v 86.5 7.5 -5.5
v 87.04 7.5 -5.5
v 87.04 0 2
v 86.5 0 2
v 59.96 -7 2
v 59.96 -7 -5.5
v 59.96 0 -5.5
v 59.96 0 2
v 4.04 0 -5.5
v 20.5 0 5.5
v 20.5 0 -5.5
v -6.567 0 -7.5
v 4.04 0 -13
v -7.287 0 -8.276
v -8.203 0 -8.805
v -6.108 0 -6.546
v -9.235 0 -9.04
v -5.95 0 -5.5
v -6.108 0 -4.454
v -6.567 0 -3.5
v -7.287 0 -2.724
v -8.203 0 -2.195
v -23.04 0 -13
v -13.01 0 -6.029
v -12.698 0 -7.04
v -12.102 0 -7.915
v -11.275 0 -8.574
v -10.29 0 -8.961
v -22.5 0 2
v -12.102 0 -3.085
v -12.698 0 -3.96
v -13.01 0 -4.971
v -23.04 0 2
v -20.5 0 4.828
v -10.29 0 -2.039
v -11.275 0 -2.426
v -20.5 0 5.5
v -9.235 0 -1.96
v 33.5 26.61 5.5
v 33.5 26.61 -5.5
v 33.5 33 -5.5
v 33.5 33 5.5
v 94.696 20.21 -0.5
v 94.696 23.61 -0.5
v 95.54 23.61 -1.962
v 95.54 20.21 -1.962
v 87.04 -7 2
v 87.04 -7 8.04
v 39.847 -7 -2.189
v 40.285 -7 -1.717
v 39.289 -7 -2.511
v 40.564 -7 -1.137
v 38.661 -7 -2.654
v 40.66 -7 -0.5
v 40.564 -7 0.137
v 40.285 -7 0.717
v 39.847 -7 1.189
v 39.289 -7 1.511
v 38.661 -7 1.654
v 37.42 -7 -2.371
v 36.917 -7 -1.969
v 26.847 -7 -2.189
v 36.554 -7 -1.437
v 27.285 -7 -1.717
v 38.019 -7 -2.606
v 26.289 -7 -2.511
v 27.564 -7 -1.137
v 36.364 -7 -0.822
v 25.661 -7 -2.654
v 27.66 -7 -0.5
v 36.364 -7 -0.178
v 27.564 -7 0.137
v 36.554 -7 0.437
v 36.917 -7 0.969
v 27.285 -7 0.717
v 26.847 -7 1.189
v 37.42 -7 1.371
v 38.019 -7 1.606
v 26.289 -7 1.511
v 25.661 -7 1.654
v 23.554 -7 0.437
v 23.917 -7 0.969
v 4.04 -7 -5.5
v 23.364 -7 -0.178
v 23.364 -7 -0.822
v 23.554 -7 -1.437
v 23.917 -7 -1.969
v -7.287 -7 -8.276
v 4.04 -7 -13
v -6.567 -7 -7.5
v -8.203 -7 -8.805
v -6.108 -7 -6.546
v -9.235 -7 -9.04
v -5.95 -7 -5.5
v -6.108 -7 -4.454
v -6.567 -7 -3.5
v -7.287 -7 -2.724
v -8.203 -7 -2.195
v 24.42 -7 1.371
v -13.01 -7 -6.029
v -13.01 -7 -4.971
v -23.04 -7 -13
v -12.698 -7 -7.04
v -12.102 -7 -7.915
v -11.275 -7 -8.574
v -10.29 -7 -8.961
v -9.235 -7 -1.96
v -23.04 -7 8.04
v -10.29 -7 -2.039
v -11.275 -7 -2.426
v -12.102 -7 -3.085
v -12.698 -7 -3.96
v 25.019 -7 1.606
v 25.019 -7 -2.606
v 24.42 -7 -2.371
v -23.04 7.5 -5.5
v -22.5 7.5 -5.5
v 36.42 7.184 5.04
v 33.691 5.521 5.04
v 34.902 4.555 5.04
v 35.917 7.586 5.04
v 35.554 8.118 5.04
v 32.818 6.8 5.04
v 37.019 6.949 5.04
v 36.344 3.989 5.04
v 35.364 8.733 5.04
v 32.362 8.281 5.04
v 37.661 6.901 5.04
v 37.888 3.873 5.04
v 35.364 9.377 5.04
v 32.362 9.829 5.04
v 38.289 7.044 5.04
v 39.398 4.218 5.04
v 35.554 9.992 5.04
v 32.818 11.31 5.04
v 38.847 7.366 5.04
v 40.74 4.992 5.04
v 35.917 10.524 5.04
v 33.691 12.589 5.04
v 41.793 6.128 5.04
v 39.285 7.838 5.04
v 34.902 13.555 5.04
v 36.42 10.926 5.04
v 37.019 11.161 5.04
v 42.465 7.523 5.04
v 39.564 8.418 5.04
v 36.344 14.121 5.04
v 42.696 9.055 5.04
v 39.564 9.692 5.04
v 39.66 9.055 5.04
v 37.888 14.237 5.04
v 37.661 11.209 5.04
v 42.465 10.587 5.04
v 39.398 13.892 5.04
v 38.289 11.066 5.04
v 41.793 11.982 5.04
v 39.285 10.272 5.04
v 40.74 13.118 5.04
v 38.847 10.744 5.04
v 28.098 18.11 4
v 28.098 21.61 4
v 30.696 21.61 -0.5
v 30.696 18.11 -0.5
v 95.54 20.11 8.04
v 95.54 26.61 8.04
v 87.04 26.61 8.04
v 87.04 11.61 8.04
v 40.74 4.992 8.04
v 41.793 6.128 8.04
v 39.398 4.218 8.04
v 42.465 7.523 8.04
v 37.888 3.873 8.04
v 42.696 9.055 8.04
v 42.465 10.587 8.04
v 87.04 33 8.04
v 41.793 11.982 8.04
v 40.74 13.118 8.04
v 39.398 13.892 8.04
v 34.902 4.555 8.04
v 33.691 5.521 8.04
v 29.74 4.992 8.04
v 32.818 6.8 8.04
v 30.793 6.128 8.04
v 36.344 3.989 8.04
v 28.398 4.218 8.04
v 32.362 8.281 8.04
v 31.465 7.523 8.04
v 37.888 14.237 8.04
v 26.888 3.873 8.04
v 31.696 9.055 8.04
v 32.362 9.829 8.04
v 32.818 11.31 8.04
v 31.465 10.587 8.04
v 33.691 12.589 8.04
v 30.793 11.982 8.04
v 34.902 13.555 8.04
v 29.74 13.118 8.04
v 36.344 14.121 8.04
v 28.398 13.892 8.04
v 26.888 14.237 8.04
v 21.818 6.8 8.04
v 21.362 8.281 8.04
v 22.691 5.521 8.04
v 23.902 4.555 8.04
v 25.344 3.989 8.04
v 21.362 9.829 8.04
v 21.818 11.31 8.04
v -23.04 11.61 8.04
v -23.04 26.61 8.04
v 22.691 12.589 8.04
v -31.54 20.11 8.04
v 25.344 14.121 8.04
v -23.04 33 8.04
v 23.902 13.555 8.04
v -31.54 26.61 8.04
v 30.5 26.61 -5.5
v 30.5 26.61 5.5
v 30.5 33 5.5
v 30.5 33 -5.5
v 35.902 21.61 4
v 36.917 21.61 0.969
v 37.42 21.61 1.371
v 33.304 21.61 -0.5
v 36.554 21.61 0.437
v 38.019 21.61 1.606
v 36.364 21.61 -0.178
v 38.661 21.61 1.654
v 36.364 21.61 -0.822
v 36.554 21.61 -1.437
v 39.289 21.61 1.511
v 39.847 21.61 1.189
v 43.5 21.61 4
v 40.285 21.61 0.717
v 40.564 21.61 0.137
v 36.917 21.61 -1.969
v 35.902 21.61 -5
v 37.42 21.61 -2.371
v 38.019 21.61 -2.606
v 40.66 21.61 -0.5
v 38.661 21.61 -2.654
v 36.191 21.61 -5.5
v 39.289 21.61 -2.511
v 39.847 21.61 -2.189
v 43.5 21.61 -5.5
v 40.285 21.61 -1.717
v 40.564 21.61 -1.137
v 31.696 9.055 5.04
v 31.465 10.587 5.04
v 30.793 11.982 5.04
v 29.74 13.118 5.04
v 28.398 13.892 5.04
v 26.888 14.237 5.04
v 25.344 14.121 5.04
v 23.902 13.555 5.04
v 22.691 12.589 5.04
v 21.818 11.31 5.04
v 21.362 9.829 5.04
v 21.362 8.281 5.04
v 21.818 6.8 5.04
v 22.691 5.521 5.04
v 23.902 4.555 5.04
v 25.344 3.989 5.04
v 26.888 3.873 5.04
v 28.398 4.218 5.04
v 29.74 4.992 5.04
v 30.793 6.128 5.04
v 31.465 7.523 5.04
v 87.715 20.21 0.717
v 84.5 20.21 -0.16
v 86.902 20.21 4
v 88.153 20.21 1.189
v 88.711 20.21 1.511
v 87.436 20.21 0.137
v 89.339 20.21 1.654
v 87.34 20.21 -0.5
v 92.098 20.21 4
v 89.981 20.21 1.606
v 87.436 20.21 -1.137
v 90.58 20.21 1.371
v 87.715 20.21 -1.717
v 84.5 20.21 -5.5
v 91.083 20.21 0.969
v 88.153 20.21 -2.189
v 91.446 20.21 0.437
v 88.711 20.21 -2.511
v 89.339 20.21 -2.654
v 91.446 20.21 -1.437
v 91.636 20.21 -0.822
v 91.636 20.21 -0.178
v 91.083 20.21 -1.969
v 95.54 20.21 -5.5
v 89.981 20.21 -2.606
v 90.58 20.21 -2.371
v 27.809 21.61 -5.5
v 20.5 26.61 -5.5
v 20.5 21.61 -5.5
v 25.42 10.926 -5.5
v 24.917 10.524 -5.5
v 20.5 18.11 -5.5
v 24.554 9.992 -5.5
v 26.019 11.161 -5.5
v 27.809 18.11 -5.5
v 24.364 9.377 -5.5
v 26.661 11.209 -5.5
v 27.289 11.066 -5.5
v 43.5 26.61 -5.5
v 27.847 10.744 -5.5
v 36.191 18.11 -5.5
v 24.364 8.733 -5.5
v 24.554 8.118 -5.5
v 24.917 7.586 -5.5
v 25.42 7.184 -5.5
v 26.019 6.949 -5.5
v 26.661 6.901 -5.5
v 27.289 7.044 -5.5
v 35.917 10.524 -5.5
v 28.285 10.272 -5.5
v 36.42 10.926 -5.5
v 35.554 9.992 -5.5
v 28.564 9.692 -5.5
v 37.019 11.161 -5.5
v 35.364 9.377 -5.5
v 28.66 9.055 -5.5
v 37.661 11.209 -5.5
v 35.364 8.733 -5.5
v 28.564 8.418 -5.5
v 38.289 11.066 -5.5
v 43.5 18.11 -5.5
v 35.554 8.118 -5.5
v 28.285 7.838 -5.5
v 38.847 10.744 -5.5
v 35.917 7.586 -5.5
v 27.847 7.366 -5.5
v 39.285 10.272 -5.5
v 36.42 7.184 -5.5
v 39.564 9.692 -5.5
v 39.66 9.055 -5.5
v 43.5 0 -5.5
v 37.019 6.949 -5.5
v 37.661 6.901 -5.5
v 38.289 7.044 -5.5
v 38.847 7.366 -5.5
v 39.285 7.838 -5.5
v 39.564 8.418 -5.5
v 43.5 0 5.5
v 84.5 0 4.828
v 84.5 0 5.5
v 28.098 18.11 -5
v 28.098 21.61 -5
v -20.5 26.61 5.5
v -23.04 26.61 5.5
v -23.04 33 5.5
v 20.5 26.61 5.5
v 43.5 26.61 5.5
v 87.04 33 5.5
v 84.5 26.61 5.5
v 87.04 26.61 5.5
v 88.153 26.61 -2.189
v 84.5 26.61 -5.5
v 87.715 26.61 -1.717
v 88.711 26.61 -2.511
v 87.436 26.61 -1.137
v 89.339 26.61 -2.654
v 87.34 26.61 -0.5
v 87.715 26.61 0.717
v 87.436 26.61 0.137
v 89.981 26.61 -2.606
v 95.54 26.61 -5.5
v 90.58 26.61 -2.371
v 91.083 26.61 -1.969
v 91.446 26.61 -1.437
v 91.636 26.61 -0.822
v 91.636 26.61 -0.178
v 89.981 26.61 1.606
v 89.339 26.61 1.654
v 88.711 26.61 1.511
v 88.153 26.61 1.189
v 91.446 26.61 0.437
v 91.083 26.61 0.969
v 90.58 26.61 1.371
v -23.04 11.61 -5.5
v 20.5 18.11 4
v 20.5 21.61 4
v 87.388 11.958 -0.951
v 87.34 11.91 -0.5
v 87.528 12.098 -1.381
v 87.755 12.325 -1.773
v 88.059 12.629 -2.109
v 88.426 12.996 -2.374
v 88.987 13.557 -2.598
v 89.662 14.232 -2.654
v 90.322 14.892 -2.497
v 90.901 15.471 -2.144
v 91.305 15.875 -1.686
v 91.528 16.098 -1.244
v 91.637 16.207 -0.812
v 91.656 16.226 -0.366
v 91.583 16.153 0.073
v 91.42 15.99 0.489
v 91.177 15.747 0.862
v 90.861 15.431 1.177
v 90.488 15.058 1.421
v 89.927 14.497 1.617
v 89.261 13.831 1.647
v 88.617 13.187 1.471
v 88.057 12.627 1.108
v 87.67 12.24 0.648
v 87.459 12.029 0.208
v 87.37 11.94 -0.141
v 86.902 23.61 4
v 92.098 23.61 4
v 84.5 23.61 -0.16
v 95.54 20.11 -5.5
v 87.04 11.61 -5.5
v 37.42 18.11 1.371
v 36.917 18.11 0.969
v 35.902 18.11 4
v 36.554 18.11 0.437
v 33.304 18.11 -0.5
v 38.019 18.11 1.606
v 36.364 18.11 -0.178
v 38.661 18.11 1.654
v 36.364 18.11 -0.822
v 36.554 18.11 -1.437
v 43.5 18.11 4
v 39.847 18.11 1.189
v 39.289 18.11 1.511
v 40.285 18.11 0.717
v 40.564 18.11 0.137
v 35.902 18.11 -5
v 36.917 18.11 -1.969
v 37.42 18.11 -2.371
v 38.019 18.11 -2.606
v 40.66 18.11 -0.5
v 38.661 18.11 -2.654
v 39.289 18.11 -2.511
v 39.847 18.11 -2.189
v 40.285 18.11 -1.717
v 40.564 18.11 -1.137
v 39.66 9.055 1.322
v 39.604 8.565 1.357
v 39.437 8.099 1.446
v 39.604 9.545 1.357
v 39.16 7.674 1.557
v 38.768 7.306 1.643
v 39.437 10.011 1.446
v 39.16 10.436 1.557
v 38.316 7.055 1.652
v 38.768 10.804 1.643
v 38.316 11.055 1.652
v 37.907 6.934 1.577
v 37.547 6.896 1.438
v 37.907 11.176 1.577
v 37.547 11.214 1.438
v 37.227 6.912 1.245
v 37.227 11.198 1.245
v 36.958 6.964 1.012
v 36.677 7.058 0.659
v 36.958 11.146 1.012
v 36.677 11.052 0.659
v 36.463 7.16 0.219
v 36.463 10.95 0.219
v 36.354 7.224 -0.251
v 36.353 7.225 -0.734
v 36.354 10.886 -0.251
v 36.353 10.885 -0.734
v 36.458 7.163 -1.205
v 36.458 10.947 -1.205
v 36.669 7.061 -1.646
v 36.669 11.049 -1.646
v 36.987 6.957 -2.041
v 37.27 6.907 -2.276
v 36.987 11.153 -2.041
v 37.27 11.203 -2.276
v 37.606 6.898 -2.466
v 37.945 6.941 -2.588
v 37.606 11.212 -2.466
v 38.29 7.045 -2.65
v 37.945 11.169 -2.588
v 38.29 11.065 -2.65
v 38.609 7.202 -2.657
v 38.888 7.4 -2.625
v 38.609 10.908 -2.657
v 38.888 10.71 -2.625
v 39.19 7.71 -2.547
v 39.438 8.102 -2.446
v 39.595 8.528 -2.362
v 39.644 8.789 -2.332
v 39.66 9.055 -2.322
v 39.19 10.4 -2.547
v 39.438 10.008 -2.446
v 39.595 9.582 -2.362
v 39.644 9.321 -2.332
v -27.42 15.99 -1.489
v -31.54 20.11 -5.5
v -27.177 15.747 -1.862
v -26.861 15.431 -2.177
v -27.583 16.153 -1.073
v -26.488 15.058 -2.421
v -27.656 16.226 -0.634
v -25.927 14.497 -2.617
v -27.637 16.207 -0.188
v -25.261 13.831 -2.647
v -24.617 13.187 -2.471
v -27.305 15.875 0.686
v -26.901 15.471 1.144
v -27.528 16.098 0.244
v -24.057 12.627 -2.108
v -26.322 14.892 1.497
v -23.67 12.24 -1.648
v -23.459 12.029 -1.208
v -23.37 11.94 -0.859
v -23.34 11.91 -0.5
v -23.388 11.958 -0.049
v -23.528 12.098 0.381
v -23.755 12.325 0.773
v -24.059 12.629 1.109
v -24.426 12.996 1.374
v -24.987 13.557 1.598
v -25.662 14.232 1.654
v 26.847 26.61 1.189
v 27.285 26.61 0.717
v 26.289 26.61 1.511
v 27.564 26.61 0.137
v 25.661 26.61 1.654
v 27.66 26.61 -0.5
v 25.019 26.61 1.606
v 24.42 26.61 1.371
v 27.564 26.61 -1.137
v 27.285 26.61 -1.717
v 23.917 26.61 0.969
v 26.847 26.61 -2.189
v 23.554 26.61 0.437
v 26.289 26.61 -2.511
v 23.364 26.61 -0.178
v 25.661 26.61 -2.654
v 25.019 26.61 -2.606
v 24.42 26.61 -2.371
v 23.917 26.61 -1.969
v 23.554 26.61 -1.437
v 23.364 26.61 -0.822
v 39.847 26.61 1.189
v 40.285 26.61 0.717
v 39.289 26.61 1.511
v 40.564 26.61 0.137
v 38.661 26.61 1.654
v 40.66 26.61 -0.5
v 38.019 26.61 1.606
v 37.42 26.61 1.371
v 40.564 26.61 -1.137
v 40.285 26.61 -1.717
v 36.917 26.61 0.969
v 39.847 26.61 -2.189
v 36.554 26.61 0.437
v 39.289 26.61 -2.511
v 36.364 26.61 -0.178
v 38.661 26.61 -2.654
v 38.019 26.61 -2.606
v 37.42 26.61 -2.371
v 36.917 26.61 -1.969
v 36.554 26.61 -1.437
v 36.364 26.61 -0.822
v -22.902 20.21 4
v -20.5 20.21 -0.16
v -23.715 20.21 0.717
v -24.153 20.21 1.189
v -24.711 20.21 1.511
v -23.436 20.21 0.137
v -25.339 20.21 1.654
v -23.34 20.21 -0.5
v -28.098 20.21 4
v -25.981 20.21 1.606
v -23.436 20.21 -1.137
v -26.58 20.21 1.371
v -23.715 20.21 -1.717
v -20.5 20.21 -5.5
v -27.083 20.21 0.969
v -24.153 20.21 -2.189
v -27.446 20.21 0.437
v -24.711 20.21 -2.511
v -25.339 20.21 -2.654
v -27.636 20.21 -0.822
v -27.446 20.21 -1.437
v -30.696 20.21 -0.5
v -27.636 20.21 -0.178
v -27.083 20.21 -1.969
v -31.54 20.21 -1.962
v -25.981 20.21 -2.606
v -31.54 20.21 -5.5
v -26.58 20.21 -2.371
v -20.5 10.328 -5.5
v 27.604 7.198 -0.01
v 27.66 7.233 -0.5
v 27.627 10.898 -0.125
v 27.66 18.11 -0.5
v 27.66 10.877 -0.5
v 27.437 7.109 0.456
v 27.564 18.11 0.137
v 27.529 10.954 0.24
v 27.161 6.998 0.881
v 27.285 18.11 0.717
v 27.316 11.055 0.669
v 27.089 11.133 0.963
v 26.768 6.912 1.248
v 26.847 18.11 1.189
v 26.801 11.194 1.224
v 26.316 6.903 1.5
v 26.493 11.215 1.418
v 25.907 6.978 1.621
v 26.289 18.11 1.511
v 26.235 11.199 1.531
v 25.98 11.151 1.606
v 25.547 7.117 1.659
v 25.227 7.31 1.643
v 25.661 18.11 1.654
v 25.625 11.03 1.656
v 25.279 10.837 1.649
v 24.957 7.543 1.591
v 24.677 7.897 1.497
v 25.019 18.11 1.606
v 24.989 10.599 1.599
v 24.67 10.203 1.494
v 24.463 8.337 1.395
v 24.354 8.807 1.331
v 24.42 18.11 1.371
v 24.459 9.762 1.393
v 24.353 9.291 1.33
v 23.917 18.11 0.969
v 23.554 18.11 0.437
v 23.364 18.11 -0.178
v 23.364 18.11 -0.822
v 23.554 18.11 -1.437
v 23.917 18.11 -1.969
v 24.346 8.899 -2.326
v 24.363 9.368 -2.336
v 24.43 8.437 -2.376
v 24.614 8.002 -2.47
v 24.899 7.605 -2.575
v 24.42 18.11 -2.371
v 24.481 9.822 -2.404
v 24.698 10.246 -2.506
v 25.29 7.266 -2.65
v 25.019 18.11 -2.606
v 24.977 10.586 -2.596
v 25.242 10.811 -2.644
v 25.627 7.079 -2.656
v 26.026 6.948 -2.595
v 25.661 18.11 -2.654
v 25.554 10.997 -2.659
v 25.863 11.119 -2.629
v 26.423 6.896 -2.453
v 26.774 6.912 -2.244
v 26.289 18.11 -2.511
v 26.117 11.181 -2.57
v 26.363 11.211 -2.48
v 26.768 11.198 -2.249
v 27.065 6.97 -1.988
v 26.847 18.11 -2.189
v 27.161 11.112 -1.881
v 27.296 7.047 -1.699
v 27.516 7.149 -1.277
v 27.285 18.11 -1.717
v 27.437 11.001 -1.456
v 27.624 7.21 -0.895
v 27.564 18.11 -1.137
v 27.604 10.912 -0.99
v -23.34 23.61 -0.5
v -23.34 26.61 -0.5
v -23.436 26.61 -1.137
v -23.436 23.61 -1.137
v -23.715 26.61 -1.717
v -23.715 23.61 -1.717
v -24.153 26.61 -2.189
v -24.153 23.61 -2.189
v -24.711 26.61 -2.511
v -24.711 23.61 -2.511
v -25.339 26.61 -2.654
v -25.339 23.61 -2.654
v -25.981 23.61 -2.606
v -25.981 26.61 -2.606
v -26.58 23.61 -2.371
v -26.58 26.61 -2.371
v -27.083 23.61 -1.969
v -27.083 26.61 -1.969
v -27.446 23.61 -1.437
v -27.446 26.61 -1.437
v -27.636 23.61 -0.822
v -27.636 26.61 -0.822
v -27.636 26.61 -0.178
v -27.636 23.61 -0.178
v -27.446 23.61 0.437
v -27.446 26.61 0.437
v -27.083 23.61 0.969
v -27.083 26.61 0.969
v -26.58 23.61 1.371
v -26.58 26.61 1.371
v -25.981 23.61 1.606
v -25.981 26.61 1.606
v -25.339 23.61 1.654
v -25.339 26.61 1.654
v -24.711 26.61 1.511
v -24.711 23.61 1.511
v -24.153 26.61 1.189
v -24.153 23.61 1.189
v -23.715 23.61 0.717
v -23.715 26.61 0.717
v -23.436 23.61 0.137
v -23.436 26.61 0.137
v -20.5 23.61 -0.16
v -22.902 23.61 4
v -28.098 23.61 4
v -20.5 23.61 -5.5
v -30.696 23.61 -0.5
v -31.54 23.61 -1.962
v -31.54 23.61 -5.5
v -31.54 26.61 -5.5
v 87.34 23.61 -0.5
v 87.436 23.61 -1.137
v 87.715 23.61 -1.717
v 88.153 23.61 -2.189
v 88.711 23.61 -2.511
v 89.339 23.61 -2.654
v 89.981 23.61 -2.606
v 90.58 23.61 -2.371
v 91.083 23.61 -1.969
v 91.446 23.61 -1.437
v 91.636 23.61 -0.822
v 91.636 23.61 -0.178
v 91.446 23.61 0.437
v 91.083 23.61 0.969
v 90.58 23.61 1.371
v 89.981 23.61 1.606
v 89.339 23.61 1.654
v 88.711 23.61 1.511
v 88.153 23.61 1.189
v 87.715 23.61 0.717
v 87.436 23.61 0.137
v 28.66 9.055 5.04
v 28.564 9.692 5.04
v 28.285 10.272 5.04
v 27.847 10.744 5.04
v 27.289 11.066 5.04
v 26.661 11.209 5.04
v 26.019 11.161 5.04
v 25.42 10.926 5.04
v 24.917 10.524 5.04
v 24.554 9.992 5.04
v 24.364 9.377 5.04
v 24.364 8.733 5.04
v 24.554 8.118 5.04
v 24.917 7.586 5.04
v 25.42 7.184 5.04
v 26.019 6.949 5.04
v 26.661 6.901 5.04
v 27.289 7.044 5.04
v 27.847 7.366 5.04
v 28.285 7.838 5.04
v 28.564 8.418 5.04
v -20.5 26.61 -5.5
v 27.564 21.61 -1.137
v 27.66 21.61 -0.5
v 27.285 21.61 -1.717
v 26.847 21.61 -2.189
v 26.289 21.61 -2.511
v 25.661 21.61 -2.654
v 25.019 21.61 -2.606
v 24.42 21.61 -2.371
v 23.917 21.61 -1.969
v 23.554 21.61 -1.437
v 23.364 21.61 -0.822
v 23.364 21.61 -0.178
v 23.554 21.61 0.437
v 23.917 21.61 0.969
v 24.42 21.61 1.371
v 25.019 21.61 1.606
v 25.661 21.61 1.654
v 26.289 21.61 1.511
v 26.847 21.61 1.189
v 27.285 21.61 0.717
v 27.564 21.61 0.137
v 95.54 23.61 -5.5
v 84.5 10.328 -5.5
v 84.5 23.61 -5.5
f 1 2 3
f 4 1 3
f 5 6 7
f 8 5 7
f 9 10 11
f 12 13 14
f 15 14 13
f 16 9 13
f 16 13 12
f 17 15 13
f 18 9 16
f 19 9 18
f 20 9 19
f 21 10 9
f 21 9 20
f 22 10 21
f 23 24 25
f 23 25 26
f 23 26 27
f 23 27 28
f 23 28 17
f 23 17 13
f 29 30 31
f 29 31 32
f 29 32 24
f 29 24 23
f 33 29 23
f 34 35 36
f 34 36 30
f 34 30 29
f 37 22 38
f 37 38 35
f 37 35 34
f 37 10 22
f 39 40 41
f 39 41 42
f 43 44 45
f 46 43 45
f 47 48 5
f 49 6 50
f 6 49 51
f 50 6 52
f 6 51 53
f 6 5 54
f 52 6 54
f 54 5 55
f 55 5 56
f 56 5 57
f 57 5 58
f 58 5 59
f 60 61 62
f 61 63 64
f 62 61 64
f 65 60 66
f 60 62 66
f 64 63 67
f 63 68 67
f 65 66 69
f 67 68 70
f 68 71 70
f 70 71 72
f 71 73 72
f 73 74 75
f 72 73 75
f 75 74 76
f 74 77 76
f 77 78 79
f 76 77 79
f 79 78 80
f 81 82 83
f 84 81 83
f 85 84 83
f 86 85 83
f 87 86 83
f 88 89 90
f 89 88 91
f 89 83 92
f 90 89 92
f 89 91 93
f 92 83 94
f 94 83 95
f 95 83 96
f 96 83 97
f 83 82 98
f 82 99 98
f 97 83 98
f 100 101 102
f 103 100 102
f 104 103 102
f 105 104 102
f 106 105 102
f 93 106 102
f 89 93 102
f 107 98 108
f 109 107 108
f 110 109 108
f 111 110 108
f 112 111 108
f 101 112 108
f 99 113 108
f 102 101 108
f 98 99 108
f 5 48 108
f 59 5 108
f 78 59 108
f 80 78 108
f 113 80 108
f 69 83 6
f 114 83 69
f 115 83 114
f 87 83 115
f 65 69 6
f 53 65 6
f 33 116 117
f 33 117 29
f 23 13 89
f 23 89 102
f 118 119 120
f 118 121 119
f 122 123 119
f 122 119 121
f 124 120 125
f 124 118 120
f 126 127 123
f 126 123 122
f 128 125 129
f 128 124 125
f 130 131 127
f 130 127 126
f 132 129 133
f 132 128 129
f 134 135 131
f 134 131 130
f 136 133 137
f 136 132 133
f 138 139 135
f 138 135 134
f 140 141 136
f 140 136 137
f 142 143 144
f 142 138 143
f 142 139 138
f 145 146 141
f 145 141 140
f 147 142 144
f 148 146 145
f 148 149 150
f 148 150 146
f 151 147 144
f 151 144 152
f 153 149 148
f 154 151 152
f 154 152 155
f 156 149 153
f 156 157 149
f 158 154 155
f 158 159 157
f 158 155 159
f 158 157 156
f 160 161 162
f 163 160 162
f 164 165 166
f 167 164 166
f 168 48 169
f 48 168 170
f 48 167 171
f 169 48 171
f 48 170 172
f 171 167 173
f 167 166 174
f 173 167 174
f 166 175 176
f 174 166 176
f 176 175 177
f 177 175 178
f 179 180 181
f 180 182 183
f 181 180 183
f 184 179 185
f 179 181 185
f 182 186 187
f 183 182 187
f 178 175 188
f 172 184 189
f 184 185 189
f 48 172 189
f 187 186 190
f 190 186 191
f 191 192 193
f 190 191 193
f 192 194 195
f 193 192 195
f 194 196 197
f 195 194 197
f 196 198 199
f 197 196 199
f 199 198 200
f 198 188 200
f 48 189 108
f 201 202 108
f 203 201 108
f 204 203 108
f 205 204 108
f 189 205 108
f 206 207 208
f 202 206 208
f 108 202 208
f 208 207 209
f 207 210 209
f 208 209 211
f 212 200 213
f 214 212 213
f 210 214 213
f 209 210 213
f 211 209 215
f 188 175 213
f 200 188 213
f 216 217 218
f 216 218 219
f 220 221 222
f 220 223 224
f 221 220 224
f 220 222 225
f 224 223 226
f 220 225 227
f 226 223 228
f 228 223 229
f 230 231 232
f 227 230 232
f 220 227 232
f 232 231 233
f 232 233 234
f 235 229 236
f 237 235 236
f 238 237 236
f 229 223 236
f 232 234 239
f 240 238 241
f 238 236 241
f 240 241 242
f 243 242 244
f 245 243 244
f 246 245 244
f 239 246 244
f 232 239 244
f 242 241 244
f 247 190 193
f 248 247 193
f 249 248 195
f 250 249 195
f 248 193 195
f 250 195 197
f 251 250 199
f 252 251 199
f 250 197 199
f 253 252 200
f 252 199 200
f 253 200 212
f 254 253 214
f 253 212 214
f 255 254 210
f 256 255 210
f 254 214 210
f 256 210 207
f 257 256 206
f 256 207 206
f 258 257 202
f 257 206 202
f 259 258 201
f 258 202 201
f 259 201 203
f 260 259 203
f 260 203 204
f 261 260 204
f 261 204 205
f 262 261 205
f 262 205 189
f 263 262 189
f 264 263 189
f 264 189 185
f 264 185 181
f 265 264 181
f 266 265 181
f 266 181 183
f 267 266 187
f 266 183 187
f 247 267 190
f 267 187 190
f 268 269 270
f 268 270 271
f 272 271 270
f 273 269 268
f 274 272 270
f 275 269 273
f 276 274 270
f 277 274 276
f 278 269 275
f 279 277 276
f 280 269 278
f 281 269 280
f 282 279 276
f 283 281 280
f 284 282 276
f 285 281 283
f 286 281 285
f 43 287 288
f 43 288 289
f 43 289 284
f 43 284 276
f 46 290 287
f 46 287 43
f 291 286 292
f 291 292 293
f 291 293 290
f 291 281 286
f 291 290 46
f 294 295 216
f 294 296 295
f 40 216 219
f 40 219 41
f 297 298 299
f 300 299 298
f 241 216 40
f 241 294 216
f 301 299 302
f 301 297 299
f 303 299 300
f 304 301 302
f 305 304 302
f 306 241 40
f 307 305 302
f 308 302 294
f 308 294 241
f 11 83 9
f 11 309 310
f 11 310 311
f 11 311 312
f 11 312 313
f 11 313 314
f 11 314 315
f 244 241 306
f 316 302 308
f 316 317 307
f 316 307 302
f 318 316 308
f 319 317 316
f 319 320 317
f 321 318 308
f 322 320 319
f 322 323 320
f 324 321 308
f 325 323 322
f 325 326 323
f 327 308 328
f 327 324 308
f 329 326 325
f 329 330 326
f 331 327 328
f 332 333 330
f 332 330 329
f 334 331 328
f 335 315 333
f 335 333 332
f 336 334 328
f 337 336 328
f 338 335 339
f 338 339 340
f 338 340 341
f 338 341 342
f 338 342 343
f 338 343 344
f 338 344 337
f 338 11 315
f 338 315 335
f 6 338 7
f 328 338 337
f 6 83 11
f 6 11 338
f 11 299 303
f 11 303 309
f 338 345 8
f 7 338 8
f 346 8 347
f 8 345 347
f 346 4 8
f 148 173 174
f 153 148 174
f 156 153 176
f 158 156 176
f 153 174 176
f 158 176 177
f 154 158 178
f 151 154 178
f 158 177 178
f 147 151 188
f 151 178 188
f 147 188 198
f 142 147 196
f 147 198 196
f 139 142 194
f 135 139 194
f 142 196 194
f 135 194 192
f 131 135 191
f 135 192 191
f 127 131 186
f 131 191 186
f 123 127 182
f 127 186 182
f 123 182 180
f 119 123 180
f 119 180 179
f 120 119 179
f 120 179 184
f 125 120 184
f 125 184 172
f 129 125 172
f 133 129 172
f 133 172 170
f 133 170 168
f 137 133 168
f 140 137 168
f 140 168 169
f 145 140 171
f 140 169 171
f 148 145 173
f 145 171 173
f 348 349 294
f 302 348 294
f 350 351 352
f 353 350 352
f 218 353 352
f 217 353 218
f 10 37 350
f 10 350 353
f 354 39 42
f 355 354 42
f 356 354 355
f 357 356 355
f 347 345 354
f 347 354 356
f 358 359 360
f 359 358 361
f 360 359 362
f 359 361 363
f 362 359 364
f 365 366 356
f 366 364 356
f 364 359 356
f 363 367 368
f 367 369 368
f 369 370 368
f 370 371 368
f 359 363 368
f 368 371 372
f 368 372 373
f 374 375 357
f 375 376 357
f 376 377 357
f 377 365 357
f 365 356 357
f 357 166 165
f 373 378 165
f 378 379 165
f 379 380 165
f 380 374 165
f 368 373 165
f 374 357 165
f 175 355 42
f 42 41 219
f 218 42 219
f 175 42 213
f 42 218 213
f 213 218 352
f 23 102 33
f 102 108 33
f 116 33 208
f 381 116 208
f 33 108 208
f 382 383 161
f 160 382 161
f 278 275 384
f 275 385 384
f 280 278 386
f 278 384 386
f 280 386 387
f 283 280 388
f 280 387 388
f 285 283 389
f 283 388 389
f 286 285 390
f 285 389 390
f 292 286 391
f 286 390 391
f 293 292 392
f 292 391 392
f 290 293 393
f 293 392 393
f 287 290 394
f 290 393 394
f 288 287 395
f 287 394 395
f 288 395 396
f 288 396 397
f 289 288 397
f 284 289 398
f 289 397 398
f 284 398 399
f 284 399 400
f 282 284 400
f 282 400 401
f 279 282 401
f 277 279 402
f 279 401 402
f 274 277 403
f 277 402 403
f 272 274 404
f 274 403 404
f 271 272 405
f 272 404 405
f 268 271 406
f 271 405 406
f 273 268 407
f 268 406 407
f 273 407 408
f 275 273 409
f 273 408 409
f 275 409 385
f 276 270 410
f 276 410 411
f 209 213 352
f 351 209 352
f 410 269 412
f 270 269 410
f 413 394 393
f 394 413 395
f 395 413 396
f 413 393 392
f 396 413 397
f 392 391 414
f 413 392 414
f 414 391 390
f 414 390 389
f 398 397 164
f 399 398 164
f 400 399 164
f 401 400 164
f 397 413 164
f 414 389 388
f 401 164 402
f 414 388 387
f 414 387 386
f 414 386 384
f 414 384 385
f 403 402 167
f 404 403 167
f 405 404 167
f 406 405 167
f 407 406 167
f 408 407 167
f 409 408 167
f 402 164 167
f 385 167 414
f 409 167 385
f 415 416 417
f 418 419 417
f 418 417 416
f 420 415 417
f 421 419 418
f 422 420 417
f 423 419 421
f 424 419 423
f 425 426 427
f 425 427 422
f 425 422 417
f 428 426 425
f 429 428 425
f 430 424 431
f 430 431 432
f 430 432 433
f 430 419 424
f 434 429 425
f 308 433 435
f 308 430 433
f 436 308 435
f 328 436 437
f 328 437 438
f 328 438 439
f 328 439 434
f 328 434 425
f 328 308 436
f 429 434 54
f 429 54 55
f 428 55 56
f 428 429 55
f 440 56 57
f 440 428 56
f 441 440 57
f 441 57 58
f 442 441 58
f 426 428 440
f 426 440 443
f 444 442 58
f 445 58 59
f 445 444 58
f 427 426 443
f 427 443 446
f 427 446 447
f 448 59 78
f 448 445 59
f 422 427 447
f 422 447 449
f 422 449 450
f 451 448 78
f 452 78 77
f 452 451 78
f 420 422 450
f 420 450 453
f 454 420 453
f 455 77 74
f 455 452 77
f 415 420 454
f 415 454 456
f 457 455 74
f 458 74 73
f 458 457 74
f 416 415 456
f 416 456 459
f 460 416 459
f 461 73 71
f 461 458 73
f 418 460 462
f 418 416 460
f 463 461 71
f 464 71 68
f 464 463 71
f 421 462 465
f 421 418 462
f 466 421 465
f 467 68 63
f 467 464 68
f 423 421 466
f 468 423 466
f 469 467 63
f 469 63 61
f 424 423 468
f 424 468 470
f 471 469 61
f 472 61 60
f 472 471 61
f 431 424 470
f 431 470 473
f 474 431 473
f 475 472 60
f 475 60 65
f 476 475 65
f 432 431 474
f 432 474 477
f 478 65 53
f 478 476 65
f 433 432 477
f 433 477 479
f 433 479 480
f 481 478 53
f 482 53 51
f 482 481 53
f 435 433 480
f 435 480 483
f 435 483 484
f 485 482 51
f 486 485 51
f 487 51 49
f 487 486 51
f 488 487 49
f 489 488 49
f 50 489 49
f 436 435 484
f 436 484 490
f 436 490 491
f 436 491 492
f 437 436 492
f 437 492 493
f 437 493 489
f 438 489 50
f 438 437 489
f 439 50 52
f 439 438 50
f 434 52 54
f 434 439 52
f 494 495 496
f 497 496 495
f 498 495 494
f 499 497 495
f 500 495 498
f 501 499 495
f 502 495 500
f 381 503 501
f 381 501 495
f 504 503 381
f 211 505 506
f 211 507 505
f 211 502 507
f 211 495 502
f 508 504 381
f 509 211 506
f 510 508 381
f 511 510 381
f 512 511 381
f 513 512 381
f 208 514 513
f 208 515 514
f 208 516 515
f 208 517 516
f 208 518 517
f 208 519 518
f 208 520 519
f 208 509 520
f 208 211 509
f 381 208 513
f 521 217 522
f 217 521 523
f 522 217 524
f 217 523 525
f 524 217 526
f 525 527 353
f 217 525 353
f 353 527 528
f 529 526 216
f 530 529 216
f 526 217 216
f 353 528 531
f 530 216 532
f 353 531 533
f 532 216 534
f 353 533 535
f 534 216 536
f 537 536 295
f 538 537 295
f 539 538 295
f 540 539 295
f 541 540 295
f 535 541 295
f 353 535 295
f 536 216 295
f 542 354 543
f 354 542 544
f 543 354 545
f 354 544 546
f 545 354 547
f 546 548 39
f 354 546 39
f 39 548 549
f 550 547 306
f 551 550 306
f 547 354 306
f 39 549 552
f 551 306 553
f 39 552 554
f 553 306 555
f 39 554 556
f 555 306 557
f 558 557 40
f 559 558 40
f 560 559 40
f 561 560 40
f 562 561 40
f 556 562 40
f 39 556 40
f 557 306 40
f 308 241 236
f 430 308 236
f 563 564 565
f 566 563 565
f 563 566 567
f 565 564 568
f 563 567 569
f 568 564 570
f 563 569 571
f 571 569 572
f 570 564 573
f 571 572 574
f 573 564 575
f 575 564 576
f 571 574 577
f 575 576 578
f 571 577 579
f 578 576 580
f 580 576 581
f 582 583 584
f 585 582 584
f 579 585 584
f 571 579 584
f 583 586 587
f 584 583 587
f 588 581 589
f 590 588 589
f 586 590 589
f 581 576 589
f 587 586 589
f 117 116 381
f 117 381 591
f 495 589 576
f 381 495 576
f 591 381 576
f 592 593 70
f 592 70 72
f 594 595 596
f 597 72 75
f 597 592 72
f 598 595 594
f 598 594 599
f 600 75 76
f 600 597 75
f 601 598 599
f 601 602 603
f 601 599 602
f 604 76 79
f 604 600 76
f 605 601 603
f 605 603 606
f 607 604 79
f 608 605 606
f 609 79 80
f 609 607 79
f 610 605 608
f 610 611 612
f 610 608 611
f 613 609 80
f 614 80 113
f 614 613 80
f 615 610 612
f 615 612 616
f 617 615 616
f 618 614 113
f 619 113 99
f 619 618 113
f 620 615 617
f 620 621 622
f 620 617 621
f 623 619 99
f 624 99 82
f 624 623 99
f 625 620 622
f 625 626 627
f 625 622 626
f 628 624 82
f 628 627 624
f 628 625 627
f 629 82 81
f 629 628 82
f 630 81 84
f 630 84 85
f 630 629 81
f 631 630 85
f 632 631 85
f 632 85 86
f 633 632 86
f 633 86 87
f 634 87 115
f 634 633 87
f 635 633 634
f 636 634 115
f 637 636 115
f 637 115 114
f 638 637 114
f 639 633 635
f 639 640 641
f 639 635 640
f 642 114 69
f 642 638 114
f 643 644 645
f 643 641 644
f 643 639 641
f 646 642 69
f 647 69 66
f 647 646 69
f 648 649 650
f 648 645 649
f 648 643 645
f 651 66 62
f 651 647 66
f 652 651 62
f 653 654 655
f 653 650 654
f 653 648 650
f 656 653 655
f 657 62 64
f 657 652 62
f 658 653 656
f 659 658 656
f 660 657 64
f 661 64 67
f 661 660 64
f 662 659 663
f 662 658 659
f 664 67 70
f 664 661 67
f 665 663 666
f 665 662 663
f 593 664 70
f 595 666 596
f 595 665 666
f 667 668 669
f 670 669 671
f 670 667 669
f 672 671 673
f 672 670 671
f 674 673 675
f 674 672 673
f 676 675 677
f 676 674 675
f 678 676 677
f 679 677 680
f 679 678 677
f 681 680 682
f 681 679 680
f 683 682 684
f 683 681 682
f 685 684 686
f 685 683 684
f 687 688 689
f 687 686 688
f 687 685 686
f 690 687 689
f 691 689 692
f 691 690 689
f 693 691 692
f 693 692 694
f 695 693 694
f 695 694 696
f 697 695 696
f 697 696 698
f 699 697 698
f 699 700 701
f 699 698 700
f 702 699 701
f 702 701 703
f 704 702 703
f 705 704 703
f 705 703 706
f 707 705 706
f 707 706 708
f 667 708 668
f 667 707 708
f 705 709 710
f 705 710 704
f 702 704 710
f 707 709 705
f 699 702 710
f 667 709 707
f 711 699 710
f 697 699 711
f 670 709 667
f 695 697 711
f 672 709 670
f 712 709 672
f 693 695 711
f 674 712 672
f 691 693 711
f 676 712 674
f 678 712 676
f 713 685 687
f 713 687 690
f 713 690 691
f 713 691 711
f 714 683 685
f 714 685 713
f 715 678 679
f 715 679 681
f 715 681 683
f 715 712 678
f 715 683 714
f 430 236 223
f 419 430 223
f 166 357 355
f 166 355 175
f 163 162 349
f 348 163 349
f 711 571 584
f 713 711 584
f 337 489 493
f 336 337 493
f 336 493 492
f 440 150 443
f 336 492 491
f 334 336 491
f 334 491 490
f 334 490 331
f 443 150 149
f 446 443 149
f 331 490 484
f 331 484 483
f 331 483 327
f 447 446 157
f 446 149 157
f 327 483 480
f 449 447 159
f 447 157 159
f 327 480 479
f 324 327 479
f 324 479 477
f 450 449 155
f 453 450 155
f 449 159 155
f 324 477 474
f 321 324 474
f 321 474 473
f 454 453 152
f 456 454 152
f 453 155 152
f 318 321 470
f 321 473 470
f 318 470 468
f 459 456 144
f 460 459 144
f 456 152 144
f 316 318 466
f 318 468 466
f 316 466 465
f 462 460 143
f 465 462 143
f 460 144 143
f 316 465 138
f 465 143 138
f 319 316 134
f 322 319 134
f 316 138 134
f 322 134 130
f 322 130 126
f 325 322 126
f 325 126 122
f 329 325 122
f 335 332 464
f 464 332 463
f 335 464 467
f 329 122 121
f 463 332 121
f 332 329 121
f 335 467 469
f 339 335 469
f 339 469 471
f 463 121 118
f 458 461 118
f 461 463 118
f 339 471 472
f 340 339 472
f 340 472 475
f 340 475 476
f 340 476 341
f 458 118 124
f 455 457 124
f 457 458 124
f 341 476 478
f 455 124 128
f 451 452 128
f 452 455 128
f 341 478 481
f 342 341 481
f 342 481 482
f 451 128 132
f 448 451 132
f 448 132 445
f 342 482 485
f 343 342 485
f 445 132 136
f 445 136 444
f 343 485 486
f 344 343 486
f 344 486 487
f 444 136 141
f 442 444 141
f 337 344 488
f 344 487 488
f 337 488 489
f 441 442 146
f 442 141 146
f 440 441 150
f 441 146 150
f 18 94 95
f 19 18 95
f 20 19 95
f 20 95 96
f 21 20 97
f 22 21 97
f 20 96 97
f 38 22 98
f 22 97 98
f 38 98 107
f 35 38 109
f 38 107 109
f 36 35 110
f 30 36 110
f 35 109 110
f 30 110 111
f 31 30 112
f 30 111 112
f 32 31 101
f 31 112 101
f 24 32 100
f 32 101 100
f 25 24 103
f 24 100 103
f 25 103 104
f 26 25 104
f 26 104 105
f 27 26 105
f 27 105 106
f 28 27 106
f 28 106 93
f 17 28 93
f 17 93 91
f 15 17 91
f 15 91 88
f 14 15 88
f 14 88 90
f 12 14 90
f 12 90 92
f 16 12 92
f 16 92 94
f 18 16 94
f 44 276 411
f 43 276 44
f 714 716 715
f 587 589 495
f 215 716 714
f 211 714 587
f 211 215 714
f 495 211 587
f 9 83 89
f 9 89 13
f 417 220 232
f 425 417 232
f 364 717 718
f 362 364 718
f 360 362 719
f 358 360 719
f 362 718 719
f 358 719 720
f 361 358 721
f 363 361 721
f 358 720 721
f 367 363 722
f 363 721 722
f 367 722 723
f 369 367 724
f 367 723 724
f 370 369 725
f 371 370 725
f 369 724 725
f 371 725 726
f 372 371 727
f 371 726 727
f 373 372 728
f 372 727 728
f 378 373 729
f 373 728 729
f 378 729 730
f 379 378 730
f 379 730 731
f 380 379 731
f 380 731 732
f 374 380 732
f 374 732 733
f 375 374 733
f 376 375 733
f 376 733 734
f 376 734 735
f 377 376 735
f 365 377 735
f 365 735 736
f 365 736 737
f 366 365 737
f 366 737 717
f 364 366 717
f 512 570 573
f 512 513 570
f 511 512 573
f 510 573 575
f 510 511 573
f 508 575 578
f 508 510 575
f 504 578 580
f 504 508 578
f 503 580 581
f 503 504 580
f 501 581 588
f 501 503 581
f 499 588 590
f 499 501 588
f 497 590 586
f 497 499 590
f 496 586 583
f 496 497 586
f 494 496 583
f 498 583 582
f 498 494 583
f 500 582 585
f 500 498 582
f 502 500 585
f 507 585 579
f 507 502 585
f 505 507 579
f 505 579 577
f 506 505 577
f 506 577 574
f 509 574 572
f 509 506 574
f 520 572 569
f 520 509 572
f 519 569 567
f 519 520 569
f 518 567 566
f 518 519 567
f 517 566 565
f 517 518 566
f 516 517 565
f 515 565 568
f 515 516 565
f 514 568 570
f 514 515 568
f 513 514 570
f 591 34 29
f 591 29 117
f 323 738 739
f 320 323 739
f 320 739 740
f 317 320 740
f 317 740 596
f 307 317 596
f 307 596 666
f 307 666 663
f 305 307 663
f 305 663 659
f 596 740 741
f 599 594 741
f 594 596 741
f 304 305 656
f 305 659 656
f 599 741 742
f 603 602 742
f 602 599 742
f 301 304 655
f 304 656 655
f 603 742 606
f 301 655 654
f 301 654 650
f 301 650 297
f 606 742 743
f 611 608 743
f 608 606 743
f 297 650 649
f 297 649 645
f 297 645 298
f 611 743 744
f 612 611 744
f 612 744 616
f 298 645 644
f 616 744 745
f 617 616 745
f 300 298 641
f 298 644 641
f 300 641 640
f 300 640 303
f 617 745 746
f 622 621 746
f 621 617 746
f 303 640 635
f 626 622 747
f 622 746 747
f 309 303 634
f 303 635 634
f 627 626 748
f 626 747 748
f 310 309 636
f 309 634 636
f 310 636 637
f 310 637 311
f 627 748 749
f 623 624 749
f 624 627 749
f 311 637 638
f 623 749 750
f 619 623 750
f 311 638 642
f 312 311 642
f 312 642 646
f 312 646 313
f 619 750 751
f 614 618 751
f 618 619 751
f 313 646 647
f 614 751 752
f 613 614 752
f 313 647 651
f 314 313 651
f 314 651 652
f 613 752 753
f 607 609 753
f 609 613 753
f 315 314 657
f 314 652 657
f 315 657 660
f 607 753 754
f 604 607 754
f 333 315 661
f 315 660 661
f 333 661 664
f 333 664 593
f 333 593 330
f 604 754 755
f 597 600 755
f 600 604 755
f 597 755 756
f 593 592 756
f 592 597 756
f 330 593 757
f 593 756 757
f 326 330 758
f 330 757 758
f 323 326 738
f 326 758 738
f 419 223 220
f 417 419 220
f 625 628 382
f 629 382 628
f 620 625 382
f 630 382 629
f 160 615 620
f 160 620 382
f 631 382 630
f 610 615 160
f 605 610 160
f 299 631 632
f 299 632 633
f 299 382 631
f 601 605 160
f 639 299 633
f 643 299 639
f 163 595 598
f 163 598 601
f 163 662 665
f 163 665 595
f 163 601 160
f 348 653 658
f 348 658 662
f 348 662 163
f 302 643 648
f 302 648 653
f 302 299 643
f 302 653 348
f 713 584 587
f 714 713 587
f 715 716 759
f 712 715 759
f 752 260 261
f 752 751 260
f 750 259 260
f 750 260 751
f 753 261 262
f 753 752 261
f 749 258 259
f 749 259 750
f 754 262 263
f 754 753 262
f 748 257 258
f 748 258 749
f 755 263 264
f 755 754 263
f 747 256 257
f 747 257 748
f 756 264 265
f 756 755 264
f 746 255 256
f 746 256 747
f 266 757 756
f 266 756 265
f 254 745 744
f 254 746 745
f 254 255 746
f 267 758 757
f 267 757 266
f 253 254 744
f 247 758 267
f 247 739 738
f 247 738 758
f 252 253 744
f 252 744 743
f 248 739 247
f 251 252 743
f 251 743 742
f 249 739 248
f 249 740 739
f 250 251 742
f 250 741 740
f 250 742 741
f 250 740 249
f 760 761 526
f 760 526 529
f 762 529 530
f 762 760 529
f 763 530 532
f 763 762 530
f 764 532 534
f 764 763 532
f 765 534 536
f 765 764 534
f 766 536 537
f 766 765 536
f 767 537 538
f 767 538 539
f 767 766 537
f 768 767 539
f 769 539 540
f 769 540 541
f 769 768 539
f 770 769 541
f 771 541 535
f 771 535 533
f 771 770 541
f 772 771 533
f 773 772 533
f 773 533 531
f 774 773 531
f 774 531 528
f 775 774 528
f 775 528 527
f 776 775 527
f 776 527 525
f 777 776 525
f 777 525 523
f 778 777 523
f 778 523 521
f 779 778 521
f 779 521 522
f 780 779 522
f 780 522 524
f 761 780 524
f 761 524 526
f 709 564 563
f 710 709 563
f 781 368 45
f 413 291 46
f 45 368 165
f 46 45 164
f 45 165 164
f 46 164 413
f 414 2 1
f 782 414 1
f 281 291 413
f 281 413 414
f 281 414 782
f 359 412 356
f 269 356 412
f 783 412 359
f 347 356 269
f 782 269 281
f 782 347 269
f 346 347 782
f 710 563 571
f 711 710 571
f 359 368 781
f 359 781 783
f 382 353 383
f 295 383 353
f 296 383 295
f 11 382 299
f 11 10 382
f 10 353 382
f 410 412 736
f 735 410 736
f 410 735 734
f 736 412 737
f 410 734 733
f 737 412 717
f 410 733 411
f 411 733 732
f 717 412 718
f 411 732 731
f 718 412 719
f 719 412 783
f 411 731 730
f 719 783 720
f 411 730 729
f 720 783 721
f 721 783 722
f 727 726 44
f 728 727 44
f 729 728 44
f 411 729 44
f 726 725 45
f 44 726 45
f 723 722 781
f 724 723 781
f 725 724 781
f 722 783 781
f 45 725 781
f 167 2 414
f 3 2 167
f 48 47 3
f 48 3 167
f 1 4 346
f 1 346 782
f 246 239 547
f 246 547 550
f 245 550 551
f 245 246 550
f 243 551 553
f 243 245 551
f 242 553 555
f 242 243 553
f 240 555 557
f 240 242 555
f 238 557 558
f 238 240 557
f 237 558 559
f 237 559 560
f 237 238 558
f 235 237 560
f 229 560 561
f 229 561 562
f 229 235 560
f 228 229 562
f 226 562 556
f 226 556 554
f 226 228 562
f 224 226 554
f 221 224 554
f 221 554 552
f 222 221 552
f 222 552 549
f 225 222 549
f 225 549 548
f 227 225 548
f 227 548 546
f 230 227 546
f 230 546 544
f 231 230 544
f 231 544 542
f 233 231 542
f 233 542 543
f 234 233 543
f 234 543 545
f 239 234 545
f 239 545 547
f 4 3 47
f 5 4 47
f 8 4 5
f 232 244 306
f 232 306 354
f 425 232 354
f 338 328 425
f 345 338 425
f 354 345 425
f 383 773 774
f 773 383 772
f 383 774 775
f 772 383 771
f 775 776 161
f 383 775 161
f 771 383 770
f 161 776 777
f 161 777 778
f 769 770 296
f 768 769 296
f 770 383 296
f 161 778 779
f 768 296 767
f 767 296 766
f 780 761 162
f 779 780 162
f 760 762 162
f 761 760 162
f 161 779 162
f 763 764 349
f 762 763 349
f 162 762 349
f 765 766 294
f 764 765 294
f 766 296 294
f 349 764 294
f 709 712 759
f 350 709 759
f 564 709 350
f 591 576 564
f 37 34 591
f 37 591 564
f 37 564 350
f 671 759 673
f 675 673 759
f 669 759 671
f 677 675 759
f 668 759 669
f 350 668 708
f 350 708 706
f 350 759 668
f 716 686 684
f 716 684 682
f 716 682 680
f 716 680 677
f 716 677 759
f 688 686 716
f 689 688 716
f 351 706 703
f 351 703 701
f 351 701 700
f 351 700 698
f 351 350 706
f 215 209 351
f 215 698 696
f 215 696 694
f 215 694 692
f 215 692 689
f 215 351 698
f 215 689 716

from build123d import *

# Parameters (mm, degrees)
SKETCH1_R               = 2.16
BOSS_EXTRUDE1_DEPTH     = 26.61
CUT_EXTRUDE1_DEPTH      = 3.5
CUT_EXTRUDE2_DEPTH      = 4
SKETCH5_W               = 110.08
SKETCH5_H               = 13.54
SKETCH5_R               = 2.16
BOSS_EXTRUDE2_DEPTH     = 7
BOSS_EXTRUDE3_DEPTH     = 6.39
BOSS_EXTRUDE4_DEPTH     = 13.54
CUT_EXTRUDE3_START      = -1.4
SKETCH8_R               = 2.16
CUT_EXTRUDE3_DEPTH      = 3.4
CUT_EXTRUDE4_START      = -29.61
SKETCH8_2_R             = 2.16
CUT_EXTRUDE4_DEPTH      = 42
CHAMFER2_SIZE           = 2
SKETCH10_R              = 2.16
CUT_EXTRUDE5_DEPTH      = 1
CUT_EXTRUDE5_DEPTH_BACK = 14.54
SKETCH10_3_R            = 5.196152423
CUT_EXTRUDE6_DEPTH      = 3
SKETCH11_W              = 27.08
SKETCH11_H              = 7
CUT_EXTRUDE7_DEPTH      = 7.5
SKETCH11_3_W            = 27.08
SKETCH11_3_H            = 7
BOSS_EXTRUDE5_DEPTH     = 7.5
SKETCH12_R              = 3.55
CUT_EXTRUDE8_DEPTH      = 7.5


with BuildPart() as part:
    # Sketch1 → Boss-Extrude1 (new body)
    with BuildSketch(Plane(origin=(0, 0, 0), x_dir=(1, 0, 0), z_dir=(0, 1, 0))):
        Polygon((-23.04, -8.04), (-23.04, 5.5), (-20.5, 5.5), (-20.5, -5.5), (20.5, -5.5), (20.5, 5.5), (23.04, 5.5), (40.96, 5.5), (43.5, 5.5), (43.5, -5.5), (84.5, -5.5), (84.5, 5.5), (87.04, 5.5), (87.04, -8.04), (40.96, -8.04), (23.04, -8.04), align=None)
        with Locations((25.5, 0.5)):
            Circle(SKETCH1_R, mode=Mode.SUBTRACT)
        with Locations((38.5, 0.5)):
            Circle(SKETCH1_R, mode=Mode.SUBTRACT)
    extrude(amount=BOSS_EXTRUDE1_DEPTH)

    # Sketch3 → Cut-Extrude1 (cut)
    with BuildSketch(Plane(origin=(0, 21.61, 0), x_dir=(1, 0, 0), z_dir=(0, 1, 0))):
        Polygon((28.098076211, -4), (30.696152423, 0.5), (28.098076211, 5), (27.809401077, 5.5), (20.5, 5.5), (20.5, -4), (22.901923789, -4), align=None)
        Polygon((35.901923789, 5), (33.303847577, 0.5), (35.901923789, -4), (41.098076211, -4), (43.5, -4), (43.5, 5.5), (36.190598923, 5.5), align=None)
    extrude(amount=-CUT_EXTRUDE1_DEPTH, mode=Mode.SUBTRACT)

    # Sketch4 → Cut-Extrude2 (cut)
    with BuildSketch(Plane.ZY.offset(23.04)):
        Polygon((-5.5, 7.5), (2, 0), (-5.5, 0), align=None)
    cut_extrude2 = extrude(amount=-CUT_EXTRUDE2_DEPTH, mode=Mode.SUBTRACT)

    # Mirror1: Cut-Extrude2 across plane
    add(cut_extrude2.mirror(Plane(origin=(32, 0, 0), x_dir=(0, 0, 1), z_dir=(1, 0, 0))), mode=Mode.SUBTRACT)

    # Sketch5 → Boss-Extrude2 (add)
    with BuildSketch(Plane.XZ):
        with Locations((32, 1.27)):
            Rectangle(SKETCH5_W, SKETCH5_H)
        with Locations((38.5, -0.5)):
            Circle(SKETCH5_R, mode=Mode.SUBTRACT)
        with Locations((25.5, -0.5)):
            Circle(SKETCH5_R, mode=Mode.SUBTRACT)
    extrude(amount=BOSS_EXTRUDE2_DEPTH)

    # Sketch6 → Boss-Extrude3 (add)
    with BuildSketch(Plane(origin=(0, 26.61, 0), x_dir=(1, 0, 0), z_dir=(0, 1, 0))):
        Polygon((-23.04, -5.5), (30.5, -5.5), (30.5, 5.5), (33.5, 5.5), (33.5, -5.5), (87.04, -5.5), (87.04, -8.04), (-23.04, -8.04), align=None)
    extrude(amount=BOSS_EXTRUDE3_DEPTH)

    # Sketch7 → Boss-Extrude4 (add)
    with BuildSketch(Plane.XY.offset(8.04)):
        Polygon((-23.04, 26.61), (-31.54, 26.61), (-31.54, 20.11), (-23.04, 11.61), align=None)
    boss_extrude4 = extrude(amount=-BOSS_EXTRUDE4_DEPTH)

    # Sketch8 → Cut-Extrude3 (cut)
    with BuildSketch(Plane(origin=(0, 21.61, 0), x_dir=(1, 0, 0), z_dir=(0, 1, 0)).offset(CUT_EXTRUDE3_START)):
        Polygon((-30.696152423, 0.5), (-31.54, 1.961586878), (-31.54, 5.5), (-20.5, 5.5), (-20.5, 0.160254038), (-22.901923789, -4), (-28.098076211, -4), align=None)
        with Locations((-25.5, 0.5)):
            Circle(SKETCH8_R, mode=Mode.SUBTRACT)
    cut_extrude3 = extrude(amount=CUT_EXTRUDE3_DEPTH, mode=Mode.SUBTRACT)

    # Sketch8<2> → Cut-Extrude4 (cut)
    with BuildSketch(Plane(origin=(0, 21.61, 0), x_dir=(1, 0, 0), z_dir=(0, 1, 0)).offset(CUT_EXTRUDE4_START)):
        with Locations((-25.5, 0.5)):
            Circle(SKETCH8_2_R)
    cut_extrude4 = extrude(amount=CUT_EXTRUDE4_DEPTH, mode=Mode.SUBTRACT)

    # Mirror2: Boss-Extrude4, Cut-Extrude3, Cut-Extrude4 across plane
    add(boss_extrude4.mirror(Plane(origin=(32, 0, 0), x_dir=(0, 0, 1), z_dir=(1, 0, 0))))
    add(cut_extrude3.mirror(Plane(origin=(32, 0, 0), x_dir=(0, 0, 1), z_dir=(1, 0, 0))), mode=Mode.SUBTRACT)
    add(cut_extrude4.mirror(Plane(origin=(32, 0, 0), x_dir=(0, 0, 1), z_dir=(1, 0, 0))), mode=Mode.SUBTRACT)

    # Chamfer2
    chamfer2_edges = [part.edges().sort_by_distance(p)[0] for p in [
        (84.5, 3.75, -1.75),
        (-20.5, 3.75, -1.75),
    ]]
    chamfer(chamfer2_edges, length=CHAMFER2_SIZE)

    # Sketch10 → Cut-Extrude5 (cut, two sides)
    with BuildSketch(Plane.XY.offset(8.04)) as cut_extrude5_sk:
        with Locations((26.5, 9.055)):
            Circle(SKETCH10_R)
        with Locations((37.5, 9.055)):
            Circle(SKETCH10_R)
    extrude(amount=CUT_EXTRUDE5_DEPTH, mode=Mode.SUBTRACT)
    extrude(cut_extrude5_sk.sketch, amount=-CUT_EXTRUDE5_DEPTH_BACK, mode=Mode.SUBTRACT)

    # Sketch10<3> → Cut-Extrude6 (cut)
    with BuildSketch(Plane.XY.offset(8.04)):
        with Locations((26.5, 9.055)):
            Circle(SKETCH10_3_R)
        with Locations((37.5, 9.055)):
            Circle(SKETCH10_3_R)
    extrude(amount=-CUT_EXTRUDE6_DEPTH, mode=Mode.SUBTRACT)

    # Sketch11 → Cut-Extrude7 (cut)
    with BuildSketch(Plane(origin=(0, 0, -5.5), x_dir=(-1, 0, 0), z_dir=(0, 0, -1))):
        with Locations((-73.5, -3.5)):
            Rectangle(SKETCH11_W, SKETCH11_H)
    extrude(amount=-CUT_EXTRUDE7_DEPTH, mode=Mode.SUBTRACT)

    # Sketch11<3> → Boss-Extrude5 (add)
    with BuildSketch(Plane(origin=(0, 0, -5.5), x_dir=(-1, 0, 0), z_dir=(0, 0, -1))):
        with Locations((9.5, -3.5)):
            Rectangle(SKETCH11_3_W, SKETCH11_3_H)
    extrude(amount=BOSS_EXTRUDE5_DEPTH)

    # Sketch12 → Cut-Extrude8 (cut)
    with BuildSketch(Plane.XZ.offset(7)):
        with Locations((-9.5, -5.5)):
            Circle(SKETCH12_R)
    extrude(amount=-CUT_EXTRUDE8_DEPTH, mode=Mode.SUBTRACT)


solid = part.part
